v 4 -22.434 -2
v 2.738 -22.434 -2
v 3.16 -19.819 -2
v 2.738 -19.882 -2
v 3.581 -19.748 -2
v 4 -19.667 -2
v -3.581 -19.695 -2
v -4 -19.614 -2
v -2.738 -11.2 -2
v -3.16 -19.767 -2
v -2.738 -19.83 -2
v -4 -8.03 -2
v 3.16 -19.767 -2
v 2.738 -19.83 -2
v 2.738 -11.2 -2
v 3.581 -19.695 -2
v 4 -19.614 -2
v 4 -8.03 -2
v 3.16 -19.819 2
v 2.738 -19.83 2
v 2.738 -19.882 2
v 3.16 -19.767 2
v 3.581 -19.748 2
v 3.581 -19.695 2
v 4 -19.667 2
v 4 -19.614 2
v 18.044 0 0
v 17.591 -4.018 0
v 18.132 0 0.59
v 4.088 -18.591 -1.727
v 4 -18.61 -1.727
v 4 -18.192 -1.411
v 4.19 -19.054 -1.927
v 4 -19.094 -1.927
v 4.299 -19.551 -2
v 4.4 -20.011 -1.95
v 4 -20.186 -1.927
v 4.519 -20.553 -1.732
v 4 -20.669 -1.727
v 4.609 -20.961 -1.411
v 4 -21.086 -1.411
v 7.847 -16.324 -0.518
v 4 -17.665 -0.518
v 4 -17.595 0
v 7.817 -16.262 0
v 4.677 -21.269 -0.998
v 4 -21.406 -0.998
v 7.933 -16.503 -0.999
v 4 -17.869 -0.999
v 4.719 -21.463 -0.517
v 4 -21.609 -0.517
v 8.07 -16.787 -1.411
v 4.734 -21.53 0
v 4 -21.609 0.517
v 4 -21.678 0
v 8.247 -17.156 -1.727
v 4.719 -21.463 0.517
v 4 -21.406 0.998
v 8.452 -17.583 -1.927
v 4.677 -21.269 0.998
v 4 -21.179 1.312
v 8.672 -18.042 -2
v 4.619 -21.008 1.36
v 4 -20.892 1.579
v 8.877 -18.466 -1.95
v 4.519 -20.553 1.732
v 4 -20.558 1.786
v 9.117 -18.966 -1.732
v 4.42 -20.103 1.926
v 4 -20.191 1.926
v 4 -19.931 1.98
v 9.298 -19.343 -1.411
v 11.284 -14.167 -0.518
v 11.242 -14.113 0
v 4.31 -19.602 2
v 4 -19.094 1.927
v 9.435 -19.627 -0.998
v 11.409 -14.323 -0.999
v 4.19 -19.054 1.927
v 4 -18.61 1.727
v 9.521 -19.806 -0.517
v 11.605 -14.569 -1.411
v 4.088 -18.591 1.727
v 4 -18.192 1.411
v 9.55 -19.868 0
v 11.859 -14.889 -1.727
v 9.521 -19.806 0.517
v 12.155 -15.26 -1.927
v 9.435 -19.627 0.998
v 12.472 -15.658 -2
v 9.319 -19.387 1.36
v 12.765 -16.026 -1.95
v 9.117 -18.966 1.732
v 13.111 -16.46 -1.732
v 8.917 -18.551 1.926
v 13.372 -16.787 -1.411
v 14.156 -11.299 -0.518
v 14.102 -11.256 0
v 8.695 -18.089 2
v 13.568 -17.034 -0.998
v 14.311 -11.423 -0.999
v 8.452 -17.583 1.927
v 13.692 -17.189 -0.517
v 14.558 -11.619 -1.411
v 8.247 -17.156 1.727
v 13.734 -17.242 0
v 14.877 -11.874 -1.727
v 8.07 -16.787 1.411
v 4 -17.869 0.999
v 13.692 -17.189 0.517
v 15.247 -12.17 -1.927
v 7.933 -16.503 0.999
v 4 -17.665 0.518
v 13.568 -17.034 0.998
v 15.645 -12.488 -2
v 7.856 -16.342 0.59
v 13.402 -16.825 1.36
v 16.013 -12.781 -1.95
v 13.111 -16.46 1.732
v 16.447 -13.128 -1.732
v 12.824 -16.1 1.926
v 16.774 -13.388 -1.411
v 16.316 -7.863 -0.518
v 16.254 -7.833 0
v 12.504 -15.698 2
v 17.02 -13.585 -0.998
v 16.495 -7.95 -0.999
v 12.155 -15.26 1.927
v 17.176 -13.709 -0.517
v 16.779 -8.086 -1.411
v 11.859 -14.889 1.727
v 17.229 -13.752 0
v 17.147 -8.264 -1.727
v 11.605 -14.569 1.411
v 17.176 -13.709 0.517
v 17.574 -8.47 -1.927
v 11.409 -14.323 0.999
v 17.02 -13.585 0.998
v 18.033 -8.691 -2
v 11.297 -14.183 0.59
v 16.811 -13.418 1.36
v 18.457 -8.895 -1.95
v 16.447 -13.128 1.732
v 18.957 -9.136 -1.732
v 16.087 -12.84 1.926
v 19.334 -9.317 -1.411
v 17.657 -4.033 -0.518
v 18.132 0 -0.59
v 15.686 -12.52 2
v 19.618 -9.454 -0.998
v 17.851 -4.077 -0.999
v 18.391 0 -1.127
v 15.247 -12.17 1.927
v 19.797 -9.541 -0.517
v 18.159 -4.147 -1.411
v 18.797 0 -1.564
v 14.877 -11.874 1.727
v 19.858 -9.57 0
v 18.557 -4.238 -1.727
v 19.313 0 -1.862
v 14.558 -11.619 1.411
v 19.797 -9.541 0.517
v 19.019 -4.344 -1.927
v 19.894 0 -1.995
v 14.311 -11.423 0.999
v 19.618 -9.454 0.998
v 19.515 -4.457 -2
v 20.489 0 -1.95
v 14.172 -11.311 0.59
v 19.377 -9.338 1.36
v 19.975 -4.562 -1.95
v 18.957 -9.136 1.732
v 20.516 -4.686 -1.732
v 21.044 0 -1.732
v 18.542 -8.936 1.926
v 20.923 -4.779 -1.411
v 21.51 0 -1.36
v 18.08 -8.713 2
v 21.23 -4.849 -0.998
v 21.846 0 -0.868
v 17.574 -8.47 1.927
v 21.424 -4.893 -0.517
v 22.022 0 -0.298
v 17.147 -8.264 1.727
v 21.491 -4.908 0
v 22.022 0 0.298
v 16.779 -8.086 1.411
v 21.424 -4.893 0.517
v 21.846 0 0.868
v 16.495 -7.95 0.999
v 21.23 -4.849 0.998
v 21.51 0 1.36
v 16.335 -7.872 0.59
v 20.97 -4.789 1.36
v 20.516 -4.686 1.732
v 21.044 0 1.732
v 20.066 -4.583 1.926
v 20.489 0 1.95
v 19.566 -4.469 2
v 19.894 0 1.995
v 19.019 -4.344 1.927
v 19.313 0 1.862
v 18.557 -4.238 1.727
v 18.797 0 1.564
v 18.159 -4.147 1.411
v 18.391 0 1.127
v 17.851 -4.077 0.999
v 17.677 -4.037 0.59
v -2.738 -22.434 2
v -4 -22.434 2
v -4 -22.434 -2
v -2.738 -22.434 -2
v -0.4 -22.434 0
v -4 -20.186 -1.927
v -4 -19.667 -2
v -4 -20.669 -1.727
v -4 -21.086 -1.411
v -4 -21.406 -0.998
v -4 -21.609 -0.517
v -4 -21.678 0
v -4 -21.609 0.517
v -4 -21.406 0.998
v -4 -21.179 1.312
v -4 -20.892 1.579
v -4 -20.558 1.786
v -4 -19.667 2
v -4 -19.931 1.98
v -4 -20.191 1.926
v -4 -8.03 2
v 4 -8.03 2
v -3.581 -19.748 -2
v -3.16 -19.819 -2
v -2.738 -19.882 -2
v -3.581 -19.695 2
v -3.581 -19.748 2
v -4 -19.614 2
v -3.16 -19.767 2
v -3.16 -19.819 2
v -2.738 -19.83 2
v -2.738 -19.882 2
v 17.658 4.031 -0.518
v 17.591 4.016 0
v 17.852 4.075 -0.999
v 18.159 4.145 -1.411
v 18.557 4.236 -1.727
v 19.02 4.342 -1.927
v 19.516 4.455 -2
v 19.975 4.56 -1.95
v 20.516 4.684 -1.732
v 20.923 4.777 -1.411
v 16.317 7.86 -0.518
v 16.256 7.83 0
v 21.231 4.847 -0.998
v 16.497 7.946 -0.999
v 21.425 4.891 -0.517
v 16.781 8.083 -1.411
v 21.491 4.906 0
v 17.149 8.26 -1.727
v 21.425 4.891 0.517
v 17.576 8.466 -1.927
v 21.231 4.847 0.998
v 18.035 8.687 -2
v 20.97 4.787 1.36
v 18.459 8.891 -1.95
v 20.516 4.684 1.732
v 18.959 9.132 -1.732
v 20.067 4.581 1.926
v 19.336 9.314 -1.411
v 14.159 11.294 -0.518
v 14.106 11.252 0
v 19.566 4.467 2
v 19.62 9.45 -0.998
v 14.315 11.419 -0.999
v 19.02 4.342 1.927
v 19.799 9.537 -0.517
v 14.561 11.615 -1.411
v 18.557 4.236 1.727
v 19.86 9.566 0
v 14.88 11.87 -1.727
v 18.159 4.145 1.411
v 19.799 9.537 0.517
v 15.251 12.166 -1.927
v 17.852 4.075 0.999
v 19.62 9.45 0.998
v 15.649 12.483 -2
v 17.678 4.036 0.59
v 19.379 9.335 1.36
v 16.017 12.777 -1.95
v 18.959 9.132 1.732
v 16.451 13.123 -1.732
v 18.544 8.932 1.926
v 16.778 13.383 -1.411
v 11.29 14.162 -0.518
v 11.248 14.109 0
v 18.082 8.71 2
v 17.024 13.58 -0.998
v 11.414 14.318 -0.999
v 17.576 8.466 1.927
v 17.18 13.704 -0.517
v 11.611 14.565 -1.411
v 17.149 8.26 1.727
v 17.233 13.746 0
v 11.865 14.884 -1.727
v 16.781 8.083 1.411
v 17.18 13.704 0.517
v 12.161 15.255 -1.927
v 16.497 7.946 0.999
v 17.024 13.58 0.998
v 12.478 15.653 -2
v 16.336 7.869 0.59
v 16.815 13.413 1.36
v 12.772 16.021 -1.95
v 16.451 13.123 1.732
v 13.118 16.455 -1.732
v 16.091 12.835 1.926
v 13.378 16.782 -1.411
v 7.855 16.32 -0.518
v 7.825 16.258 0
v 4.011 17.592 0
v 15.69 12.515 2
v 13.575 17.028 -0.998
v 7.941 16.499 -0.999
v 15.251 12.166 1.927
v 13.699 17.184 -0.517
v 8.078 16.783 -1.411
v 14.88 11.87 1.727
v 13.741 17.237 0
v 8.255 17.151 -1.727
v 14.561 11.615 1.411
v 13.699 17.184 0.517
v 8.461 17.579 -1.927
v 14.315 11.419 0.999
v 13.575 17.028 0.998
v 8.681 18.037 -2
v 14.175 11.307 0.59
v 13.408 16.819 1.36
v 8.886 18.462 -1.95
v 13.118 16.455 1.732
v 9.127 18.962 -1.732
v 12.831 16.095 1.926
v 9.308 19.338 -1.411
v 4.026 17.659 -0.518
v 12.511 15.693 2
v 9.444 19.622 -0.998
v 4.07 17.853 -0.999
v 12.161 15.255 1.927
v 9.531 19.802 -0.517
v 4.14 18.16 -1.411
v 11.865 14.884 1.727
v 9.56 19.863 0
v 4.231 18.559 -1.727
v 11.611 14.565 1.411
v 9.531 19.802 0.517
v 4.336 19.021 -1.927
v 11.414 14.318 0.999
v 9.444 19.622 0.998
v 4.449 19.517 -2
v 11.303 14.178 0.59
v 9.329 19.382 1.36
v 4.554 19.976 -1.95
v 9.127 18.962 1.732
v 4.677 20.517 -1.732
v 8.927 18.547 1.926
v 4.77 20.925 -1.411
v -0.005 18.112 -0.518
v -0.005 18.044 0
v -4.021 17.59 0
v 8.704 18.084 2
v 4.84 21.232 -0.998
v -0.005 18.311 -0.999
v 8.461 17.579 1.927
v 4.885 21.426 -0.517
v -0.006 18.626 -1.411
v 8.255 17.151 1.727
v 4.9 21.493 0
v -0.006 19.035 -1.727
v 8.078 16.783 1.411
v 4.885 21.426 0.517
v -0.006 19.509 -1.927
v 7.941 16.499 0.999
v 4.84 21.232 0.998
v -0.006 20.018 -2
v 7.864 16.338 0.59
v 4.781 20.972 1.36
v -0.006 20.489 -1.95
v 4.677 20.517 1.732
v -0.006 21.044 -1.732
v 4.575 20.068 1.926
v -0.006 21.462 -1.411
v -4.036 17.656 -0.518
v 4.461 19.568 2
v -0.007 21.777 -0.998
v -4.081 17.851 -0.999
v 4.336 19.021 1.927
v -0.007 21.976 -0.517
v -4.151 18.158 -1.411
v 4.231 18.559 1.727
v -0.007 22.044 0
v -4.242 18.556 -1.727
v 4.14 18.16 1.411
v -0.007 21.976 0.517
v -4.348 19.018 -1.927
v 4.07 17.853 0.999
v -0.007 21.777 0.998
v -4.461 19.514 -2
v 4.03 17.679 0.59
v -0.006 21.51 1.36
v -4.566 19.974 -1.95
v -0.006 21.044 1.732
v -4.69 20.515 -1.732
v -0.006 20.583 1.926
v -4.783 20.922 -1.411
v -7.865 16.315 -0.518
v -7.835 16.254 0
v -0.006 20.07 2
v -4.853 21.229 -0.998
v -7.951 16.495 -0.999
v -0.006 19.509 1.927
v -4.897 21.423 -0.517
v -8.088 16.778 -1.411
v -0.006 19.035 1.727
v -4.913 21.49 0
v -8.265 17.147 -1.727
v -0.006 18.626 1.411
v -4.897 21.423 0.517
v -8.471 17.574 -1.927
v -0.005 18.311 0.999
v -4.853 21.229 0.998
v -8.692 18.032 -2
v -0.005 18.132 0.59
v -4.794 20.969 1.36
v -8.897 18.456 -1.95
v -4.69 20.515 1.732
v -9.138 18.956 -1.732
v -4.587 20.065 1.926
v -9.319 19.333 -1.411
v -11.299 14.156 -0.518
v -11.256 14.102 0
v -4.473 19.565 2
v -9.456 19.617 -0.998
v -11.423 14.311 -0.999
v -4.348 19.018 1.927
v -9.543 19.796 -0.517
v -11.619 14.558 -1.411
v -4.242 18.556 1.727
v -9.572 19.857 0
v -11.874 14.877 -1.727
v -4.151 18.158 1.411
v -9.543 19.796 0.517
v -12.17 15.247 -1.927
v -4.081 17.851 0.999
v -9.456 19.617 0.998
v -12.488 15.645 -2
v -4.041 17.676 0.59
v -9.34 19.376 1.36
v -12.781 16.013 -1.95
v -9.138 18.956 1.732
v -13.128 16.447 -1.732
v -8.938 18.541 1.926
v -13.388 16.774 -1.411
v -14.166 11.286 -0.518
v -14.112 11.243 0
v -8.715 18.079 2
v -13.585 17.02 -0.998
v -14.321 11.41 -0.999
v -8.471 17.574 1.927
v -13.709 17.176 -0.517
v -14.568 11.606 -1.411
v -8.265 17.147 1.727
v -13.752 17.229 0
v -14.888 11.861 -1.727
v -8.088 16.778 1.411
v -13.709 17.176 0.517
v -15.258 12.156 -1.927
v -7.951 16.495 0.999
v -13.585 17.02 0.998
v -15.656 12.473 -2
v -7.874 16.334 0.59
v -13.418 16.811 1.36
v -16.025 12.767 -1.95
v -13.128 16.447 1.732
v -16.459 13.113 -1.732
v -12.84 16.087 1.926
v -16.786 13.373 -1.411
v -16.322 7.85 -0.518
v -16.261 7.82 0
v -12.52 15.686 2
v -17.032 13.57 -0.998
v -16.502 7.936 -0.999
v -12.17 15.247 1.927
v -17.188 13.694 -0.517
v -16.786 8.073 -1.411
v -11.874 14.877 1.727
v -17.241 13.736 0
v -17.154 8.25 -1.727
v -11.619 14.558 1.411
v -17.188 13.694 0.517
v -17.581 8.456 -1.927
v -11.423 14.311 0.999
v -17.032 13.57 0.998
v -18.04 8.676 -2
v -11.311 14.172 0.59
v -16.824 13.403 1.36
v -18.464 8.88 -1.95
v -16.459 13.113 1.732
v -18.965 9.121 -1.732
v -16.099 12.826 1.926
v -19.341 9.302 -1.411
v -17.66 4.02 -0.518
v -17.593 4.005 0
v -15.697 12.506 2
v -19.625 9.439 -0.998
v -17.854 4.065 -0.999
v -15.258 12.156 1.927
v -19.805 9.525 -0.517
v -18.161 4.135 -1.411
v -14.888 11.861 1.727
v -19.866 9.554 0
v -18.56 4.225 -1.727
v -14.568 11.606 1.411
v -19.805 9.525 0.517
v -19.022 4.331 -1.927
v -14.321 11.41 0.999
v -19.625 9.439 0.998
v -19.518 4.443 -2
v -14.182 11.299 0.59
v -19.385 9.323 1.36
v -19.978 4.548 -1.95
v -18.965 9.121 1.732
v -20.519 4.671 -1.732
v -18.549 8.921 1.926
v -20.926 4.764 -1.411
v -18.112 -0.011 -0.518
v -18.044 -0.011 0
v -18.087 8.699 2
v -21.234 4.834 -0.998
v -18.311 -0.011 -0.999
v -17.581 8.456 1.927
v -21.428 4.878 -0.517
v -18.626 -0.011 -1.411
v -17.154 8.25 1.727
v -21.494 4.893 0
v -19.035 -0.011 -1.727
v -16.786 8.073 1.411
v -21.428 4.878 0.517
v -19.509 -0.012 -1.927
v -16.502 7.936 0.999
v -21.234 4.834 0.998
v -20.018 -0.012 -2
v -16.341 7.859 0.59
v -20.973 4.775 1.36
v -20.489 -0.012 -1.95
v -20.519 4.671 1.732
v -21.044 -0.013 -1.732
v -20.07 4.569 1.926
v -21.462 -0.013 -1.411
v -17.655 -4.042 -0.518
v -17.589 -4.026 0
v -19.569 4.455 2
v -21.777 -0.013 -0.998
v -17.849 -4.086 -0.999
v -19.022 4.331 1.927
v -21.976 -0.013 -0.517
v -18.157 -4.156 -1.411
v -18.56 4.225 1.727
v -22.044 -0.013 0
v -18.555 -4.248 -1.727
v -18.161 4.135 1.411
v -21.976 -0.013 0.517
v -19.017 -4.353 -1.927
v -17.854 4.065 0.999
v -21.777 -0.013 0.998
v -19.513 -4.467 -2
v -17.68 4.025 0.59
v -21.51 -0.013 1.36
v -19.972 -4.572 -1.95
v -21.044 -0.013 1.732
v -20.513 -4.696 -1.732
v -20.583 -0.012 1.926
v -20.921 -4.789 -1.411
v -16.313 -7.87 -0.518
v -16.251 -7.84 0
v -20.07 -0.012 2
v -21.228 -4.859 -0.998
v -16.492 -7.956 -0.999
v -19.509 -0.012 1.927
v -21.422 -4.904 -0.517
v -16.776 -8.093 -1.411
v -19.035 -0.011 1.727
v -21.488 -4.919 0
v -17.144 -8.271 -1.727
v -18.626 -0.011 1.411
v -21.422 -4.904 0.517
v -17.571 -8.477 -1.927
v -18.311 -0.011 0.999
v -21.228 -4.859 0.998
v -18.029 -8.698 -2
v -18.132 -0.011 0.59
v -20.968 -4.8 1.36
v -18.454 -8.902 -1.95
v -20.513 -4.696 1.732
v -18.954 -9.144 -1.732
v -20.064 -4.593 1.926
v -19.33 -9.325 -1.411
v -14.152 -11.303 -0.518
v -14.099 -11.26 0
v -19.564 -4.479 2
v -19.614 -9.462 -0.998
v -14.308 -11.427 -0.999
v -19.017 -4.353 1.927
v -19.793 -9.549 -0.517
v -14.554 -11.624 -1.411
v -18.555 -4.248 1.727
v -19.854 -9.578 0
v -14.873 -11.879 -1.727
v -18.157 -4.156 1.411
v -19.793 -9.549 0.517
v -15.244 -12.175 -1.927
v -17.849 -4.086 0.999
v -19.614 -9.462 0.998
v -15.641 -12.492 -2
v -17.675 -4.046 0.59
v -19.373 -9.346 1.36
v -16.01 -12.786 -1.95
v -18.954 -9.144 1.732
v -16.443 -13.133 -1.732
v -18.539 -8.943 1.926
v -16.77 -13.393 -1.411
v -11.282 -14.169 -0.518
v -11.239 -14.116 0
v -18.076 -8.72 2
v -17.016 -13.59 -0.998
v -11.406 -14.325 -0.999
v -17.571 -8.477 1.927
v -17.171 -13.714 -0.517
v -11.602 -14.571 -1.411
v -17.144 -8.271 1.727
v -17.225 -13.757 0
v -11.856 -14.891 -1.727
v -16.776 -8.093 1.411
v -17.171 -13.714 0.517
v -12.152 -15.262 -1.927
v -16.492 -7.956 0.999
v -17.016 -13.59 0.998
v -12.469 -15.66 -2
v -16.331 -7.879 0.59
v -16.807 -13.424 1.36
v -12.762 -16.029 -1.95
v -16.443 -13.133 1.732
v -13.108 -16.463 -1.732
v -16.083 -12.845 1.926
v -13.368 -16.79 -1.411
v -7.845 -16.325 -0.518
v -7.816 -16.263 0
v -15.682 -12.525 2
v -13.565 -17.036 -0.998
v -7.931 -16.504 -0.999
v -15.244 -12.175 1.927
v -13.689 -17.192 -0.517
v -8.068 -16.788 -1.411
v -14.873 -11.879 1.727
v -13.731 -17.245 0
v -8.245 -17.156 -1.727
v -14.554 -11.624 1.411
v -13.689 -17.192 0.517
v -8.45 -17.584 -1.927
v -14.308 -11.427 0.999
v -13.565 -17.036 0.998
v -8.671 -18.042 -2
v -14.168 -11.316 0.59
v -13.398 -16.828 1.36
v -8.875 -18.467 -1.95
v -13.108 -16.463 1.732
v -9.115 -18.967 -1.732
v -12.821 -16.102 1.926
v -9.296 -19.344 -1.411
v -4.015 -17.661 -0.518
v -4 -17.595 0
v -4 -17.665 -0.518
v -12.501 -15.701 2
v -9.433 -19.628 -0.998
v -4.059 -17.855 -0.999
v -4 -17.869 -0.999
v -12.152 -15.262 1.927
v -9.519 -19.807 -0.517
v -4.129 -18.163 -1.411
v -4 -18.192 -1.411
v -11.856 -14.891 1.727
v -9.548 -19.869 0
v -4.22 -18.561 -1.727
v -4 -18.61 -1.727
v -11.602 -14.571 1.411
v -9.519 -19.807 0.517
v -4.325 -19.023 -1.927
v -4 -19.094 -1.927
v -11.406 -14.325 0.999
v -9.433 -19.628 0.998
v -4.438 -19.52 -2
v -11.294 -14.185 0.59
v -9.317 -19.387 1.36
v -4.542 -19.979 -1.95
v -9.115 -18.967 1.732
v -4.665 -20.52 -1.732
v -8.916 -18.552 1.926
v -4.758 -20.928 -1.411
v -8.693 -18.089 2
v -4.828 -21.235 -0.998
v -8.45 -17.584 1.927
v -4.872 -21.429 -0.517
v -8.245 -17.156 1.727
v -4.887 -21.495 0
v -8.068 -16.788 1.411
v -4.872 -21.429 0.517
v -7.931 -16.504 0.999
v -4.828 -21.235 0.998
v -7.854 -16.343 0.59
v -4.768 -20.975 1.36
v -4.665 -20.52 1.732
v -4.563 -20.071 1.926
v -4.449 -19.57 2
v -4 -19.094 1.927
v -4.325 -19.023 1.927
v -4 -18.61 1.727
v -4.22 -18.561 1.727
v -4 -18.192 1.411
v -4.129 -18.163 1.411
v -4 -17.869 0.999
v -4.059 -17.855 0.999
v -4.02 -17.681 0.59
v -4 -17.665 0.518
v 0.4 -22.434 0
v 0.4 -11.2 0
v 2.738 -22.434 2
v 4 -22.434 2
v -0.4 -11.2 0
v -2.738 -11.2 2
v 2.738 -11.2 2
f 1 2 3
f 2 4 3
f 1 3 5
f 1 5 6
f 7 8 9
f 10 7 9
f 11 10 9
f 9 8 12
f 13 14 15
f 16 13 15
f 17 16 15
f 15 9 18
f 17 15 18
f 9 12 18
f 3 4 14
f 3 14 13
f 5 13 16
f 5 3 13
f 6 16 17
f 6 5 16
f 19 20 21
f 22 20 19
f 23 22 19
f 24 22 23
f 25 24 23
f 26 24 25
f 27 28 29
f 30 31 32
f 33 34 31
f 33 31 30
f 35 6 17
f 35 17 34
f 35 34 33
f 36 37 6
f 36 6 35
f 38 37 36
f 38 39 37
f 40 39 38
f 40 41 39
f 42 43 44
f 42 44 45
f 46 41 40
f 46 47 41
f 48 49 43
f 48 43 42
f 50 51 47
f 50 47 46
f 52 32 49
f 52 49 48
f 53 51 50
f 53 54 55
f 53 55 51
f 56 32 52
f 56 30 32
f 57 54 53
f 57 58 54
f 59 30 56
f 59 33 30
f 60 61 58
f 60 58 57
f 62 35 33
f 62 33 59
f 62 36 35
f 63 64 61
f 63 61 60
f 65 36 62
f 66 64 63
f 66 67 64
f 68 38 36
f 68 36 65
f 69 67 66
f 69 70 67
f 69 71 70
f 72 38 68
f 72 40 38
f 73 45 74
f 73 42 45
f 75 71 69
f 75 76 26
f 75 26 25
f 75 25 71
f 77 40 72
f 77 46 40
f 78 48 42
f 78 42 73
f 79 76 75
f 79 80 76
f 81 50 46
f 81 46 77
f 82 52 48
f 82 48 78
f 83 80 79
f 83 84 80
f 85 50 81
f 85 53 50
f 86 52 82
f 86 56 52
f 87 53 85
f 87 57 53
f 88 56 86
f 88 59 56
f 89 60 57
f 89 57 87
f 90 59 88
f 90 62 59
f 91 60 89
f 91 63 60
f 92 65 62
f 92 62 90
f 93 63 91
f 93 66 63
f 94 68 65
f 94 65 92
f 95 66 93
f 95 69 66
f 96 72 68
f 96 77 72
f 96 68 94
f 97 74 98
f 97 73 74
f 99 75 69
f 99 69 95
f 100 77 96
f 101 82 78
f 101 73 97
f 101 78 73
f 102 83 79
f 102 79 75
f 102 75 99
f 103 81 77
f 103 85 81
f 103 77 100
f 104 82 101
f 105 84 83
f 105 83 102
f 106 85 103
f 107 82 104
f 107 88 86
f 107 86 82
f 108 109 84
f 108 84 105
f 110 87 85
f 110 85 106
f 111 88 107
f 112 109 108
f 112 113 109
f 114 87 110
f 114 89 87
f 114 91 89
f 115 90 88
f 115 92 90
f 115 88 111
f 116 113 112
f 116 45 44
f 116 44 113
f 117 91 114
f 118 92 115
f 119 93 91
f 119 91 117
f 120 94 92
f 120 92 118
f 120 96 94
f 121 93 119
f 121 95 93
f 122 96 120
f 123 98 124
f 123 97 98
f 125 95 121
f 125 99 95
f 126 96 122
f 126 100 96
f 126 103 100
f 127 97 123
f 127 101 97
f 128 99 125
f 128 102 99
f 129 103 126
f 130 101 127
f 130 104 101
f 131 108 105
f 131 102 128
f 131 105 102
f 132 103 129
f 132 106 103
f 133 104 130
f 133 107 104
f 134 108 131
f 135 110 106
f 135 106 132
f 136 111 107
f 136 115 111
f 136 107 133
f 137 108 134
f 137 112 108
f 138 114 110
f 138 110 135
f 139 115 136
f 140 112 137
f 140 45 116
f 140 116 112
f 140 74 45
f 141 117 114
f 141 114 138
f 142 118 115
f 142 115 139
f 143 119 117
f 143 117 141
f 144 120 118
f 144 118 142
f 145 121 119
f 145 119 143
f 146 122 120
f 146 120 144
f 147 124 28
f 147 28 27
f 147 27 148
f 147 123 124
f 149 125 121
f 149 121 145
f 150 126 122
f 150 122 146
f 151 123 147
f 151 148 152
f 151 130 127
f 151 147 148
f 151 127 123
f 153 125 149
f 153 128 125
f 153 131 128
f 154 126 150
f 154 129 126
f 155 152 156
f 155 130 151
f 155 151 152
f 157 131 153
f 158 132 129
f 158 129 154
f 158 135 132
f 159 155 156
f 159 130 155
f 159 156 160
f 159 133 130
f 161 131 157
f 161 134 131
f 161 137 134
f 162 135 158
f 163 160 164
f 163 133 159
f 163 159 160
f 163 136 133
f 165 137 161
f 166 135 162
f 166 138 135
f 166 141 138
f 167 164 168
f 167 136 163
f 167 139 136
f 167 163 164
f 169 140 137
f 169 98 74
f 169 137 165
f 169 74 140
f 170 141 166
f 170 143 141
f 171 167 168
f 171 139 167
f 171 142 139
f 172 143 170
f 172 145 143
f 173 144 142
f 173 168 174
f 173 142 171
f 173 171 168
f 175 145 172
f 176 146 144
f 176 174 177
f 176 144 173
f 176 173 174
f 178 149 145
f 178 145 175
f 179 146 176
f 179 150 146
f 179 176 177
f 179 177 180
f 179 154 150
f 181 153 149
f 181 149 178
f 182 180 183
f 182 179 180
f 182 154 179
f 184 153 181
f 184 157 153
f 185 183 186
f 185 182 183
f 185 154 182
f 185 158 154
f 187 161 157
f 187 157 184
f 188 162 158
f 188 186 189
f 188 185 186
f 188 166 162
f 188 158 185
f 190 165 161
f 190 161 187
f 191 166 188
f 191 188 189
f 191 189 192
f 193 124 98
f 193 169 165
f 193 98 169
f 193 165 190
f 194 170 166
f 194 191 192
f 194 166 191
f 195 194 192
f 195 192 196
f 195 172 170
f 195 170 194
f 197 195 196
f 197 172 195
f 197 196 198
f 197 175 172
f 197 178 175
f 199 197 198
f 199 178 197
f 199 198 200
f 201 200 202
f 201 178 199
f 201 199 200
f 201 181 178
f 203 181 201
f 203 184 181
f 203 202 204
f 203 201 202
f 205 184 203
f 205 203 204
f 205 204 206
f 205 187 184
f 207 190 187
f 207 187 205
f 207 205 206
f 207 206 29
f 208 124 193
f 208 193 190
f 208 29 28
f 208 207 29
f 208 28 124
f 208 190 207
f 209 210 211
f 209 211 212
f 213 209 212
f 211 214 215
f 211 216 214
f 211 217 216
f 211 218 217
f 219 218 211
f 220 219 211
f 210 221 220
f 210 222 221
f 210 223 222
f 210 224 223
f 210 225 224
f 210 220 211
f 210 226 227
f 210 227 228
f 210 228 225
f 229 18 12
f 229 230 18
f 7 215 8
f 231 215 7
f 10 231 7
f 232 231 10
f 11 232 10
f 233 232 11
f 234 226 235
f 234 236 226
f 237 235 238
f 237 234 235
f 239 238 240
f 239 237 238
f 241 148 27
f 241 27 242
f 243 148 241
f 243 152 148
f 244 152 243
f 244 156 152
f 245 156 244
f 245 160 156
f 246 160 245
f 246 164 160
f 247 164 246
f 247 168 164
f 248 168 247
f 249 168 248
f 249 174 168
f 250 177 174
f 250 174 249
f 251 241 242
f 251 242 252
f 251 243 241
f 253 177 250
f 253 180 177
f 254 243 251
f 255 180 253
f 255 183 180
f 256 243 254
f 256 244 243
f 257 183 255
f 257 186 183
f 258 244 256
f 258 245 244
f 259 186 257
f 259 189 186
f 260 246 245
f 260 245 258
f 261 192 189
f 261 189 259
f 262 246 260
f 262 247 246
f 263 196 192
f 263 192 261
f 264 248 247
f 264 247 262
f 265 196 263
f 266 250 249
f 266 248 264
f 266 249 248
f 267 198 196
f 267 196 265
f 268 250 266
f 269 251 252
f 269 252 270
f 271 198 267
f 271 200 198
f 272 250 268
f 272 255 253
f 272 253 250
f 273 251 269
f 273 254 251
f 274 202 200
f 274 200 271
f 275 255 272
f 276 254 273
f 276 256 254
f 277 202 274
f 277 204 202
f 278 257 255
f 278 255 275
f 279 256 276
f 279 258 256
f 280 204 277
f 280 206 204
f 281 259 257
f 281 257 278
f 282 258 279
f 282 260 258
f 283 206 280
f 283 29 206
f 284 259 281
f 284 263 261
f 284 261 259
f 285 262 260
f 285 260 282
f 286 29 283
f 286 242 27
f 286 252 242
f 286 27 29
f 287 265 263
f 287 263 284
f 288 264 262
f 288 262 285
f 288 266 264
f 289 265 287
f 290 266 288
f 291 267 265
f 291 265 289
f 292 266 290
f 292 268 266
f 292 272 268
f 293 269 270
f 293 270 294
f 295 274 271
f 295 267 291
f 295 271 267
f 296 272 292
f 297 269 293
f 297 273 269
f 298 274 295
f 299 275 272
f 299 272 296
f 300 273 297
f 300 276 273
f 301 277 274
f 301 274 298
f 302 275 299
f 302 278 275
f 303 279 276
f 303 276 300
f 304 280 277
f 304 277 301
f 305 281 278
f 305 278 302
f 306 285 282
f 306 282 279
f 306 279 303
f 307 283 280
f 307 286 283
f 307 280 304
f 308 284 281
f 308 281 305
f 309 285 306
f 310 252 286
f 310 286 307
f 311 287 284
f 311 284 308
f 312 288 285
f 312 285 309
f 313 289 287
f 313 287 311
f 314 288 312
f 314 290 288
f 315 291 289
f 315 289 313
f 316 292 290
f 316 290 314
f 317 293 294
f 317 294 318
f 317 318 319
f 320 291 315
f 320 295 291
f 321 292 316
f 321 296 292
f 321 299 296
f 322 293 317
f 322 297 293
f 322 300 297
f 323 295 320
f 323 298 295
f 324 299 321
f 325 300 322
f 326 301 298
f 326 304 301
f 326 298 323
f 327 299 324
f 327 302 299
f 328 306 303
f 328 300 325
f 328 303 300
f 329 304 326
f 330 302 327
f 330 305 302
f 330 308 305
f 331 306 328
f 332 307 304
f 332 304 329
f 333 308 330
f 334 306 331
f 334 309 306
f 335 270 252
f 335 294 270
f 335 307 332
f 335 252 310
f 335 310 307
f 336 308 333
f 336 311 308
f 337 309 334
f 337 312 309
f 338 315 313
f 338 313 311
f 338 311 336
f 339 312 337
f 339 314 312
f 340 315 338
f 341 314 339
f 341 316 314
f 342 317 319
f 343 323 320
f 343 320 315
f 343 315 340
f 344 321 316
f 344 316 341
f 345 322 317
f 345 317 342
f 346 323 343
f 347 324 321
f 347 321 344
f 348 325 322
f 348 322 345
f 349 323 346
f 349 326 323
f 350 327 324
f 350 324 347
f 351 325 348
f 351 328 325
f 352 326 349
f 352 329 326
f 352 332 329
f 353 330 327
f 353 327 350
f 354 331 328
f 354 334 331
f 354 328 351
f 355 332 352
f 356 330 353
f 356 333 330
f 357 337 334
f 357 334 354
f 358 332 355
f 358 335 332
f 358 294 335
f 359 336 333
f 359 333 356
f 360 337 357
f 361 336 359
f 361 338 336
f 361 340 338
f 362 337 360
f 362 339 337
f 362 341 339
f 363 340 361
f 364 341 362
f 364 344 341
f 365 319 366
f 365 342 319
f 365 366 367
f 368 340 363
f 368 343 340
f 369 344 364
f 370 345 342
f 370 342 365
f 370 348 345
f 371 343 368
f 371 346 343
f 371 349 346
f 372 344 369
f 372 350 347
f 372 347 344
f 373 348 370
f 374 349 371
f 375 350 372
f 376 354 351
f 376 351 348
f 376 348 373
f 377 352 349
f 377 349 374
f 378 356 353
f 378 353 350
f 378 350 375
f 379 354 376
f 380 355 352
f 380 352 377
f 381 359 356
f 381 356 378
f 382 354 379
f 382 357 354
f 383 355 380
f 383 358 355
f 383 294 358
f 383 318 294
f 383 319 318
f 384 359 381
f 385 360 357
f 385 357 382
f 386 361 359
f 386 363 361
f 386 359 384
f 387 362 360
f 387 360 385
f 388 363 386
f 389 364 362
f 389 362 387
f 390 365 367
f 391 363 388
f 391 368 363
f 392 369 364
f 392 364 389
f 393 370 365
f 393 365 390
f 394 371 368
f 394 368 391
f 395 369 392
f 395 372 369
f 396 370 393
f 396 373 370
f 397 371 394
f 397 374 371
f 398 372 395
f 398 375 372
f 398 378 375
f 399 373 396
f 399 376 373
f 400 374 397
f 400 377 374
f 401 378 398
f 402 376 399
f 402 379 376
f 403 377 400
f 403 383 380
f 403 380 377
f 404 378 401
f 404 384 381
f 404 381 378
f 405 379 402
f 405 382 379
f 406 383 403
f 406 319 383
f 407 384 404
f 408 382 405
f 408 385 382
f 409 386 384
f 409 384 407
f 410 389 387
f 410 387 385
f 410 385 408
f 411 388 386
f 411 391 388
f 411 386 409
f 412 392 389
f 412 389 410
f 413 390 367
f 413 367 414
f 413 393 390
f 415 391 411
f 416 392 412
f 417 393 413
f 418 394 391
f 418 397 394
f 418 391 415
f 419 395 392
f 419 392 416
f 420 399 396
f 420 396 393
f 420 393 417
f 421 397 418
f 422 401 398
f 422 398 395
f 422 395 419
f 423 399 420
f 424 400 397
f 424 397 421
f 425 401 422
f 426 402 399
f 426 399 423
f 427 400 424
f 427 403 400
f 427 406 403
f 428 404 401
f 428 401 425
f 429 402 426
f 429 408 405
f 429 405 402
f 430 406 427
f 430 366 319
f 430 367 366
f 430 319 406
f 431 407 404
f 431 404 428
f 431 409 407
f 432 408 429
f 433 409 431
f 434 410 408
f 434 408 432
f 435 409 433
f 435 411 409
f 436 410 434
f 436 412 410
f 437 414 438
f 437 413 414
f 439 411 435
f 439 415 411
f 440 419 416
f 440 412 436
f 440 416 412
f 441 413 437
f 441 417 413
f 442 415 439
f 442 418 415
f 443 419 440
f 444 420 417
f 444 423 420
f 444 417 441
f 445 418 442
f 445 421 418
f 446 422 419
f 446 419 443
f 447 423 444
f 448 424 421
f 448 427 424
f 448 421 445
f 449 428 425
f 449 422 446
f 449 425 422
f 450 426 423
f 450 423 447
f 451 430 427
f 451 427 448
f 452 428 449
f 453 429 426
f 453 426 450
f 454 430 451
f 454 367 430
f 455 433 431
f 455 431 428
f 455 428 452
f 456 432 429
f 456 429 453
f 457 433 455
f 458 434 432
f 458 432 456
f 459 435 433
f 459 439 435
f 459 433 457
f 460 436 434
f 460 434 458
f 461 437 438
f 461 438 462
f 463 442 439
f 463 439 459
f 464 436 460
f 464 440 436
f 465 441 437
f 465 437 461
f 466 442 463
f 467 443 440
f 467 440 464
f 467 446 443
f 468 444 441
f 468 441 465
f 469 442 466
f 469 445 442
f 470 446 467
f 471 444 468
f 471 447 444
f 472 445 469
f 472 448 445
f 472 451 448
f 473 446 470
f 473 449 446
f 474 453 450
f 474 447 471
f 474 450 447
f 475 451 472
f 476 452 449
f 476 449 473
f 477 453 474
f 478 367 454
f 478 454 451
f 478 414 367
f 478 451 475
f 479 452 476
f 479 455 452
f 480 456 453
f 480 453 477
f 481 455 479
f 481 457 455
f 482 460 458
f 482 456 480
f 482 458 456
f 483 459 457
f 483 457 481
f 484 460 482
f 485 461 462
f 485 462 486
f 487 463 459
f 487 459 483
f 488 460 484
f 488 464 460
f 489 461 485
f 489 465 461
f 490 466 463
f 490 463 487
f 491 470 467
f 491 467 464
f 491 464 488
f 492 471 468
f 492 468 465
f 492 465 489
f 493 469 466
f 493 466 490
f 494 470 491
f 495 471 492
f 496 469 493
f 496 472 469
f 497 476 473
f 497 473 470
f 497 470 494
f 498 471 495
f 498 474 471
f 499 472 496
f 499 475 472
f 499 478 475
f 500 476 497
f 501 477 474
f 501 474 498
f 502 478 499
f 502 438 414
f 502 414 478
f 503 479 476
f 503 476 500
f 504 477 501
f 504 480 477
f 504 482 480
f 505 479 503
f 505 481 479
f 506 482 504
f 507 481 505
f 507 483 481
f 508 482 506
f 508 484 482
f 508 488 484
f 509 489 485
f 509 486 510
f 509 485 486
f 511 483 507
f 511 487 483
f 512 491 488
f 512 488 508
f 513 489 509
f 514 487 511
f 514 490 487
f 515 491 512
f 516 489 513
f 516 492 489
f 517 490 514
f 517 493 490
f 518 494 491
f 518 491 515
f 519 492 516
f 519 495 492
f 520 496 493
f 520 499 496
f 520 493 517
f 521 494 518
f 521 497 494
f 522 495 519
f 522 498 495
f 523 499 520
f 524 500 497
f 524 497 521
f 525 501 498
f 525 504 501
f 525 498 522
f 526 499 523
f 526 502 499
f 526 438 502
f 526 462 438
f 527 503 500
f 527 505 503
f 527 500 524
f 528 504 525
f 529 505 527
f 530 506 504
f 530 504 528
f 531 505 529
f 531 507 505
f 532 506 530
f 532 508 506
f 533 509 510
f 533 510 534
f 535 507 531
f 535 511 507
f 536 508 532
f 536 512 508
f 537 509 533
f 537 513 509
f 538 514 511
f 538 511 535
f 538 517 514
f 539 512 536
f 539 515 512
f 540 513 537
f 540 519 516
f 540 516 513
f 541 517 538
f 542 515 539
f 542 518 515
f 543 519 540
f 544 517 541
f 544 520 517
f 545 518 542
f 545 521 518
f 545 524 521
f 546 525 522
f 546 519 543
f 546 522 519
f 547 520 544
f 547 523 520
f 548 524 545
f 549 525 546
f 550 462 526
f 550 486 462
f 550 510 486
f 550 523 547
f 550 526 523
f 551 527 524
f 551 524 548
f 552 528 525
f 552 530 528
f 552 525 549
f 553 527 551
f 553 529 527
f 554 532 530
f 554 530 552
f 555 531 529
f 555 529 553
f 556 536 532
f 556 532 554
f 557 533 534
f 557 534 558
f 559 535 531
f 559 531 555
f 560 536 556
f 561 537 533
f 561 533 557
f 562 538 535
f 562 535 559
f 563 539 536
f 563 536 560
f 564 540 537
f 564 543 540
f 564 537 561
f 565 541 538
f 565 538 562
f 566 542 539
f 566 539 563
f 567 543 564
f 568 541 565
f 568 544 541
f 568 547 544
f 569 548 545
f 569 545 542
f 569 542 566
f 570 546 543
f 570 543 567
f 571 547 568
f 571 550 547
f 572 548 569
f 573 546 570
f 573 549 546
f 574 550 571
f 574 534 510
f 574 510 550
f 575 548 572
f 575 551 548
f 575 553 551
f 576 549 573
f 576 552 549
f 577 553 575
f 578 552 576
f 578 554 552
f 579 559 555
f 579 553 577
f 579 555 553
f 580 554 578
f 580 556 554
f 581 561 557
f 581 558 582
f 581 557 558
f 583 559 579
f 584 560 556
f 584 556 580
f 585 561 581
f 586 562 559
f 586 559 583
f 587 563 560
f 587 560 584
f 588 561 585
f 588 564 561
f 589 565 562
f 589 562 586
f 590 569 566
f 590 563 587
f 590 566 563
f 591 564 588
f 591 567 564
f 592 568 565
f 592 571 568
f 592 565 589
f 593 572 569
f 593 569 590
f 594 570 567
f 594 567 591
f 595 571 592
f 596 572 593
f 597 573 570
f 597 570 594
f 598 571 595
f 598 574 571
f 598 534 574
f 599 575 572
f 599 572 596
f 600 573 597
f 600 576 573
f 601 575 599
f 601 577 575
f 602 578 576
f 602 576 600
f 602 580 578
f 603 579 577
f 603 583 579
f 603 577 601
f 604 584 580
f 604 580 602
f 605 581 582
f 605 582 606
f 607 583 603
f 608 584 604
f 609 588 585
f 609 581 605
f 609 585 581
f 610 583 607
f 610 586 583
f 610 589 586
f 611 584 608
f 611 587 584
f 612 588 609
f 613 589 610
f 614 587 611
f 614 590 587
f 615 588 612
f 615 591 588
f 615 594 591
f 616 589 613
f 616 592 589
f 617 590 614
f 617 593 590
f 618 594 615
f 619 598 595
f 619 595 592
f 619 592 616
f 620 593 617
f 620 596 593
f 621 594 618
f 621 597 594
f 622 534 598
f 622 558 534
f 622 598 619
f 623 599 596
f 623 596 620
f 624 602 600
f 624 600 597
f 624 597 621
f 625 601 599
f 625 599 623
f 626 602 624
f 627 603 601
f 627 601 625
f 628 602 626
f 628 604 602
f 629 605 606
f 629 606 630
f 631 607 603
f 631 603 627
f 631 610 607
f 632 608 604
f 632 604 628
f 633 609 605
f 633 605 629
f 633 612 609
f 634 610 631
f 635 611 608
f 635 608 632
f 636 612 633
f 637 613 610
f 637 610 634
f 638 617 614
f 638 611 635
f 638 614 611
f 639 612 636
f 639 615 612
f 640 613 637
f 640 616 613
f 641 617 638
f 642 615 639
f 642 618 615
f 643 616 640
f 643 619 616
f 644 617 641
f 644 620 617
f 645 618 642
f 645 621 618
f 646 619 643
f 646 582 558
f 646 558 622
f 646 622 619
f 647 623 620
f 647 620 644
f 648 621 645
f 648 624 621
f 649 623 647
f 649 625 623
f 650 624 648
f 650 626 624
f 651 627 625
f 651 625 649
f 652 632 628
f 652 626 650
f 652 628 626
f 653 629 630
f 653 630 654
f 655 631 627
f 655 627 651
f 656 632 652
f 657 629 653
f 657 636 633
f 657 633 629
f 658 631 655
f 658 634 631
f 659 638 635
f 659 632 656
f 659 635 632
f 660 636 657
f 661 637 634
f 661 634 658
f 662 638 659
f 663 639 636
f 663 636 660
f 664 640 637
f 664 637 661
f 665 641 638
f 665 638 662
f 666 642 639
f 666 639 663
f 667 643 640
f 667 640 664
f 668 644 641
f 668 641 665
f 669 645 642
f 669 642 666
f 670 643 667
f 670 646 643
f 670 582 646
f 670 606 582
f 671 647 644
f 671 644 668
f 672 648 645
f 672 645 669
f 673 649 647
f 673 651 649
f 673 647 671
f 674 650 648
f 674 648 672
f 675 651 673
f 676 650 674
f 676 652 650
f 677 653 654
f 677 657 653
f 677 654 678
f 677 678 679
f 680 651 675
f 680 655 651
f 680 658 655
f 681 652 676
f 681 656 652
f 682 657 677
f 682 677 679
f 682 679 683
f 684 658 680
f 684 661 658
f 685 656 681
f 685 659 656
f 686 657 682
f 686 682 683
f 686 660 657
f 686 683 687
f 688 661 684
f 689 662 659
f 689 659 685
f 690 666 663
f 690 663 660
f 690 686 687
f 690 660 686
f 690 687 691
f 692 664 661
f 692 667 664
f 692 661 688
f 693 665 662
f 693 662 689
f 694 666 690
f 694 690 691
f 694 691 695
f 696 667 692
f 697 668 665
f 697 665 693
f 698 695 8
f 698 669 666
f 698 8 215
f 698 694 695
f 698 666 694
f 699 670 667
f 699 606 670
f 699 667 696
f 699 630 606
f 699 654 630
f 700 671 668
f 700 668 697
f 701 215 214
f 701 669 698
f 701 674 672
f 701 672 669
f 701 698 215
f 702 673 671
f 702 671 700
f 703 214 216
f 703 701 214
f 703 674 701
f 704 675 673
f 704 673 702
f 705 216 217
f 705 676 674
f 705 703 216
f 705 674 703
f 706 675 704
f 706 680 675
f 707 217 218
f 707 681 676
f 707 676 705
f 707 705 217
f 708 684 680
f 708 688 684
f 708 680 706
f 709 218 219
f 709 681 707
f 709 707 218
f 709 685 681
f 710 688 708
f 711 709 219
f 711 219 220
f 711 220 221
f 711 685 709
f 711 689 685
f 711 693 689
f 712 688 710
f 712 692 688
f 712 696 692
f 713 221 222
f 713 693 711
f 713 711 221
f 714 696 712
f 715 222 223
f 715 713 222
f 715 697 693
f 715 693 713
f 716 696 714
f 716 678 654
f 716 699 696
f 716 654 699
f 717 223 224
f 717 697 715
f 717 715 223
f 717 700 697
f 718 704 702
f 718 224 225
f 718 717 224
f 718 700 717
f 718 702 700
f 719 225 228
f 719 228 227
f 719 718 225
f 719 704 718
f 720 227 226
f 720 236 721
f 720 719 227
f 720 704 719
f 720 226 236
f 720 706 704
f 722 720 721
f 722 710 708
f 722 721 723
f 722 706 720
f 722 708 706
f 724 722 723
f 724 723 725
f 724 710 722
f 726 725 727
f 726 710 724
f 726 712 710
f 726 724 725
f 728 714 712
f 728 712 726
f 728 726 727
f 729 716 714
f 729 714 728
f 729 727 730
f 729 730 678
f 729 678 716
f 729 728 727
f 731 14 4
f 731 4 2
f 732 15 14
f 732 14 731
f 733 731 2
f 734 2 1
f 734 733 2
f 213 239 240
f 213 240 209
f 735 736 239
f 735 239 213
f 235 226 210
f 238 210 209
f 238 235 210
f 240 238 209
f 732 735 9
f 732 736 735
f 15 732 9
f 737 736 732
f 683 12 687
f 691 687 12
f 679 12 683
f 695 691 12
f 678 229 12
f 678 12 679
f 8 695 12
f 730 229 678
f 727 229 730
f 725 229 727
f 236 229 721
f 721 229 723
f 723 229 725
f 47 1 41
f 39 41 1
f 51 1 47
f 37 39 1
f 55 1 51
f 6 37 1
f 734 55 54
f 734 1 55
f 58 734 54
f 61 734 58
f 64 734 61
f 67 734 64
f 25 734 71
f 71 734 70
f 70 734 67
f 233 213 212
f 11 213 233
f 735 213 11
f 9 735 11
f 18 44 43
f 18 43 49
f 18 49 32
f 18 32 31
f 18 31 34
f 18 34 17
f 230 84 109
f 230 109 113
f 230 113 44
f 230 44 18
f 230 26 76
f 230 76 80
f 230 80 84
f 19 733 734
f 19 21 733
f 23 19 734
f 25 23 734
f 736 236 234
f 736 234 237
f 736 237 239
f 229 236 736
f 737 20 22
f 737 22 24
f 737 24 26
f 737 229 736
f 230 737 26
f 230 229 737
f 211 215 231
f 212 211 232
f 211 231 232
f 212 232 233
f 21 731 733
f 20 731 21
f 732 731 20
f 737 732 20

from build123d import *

# Parameters (mm, degrees)
F1_R          = 2.0001698285
F4_DEPTH      = 2
F4_DEPTH_BACK = 2
F6_START      = 11.2
F6_DEPTH      = 25.6


with BuildPart() as f2:
    # F2: sweep along a path in F0
    with BuildLine(Plane.XY) as f2_path:
        CenterArc((0, 0), 18, 0, 360)
    # F1 (on Front) → F2 (sweep)
    with BuildSketch(Plane.XZ):
        with Locations((-20.043771714, 0)):
            Circle(F1_R)
    sweep(path=f2_path.line)

    # F3 (on Top) → F4 (join, two sides)
    with BuildSketch(Plane.XY) as f4_sk:
        Polygon((4, -8.0302771777), (0, -8.0302771777), (-4, -8.0302771777), (-4, -19.9341345578), (-4, -22.4341345578), (4, -22.4341345578), (4, -19.9341345578), align=None)
    extrude(amount=F4_DEPTH)
    extrude(f4_sk.sketch, amount=-F4_DEPTH_BACK)

    # F5 (on Front) → F6 (cut)
    with BuildSketch(Plane.XZ.offset(F6_START)):
        Polygon((-2.7534713777, -2.0129208903), (2.7534713777, -2.0129208903), (0.4, 0), (0, 0), (-0.4, 0), align=None)
        Polygon((0, 0), (0.4, 0), (2.7534713777, 2.0129208903), (-2.7534713777, 2.0129208903), (-0.4, 0), align=None)
    extrude(amount=F6_DEPTH, mode=Mode.SUBTRACT)


solid = f2.part
